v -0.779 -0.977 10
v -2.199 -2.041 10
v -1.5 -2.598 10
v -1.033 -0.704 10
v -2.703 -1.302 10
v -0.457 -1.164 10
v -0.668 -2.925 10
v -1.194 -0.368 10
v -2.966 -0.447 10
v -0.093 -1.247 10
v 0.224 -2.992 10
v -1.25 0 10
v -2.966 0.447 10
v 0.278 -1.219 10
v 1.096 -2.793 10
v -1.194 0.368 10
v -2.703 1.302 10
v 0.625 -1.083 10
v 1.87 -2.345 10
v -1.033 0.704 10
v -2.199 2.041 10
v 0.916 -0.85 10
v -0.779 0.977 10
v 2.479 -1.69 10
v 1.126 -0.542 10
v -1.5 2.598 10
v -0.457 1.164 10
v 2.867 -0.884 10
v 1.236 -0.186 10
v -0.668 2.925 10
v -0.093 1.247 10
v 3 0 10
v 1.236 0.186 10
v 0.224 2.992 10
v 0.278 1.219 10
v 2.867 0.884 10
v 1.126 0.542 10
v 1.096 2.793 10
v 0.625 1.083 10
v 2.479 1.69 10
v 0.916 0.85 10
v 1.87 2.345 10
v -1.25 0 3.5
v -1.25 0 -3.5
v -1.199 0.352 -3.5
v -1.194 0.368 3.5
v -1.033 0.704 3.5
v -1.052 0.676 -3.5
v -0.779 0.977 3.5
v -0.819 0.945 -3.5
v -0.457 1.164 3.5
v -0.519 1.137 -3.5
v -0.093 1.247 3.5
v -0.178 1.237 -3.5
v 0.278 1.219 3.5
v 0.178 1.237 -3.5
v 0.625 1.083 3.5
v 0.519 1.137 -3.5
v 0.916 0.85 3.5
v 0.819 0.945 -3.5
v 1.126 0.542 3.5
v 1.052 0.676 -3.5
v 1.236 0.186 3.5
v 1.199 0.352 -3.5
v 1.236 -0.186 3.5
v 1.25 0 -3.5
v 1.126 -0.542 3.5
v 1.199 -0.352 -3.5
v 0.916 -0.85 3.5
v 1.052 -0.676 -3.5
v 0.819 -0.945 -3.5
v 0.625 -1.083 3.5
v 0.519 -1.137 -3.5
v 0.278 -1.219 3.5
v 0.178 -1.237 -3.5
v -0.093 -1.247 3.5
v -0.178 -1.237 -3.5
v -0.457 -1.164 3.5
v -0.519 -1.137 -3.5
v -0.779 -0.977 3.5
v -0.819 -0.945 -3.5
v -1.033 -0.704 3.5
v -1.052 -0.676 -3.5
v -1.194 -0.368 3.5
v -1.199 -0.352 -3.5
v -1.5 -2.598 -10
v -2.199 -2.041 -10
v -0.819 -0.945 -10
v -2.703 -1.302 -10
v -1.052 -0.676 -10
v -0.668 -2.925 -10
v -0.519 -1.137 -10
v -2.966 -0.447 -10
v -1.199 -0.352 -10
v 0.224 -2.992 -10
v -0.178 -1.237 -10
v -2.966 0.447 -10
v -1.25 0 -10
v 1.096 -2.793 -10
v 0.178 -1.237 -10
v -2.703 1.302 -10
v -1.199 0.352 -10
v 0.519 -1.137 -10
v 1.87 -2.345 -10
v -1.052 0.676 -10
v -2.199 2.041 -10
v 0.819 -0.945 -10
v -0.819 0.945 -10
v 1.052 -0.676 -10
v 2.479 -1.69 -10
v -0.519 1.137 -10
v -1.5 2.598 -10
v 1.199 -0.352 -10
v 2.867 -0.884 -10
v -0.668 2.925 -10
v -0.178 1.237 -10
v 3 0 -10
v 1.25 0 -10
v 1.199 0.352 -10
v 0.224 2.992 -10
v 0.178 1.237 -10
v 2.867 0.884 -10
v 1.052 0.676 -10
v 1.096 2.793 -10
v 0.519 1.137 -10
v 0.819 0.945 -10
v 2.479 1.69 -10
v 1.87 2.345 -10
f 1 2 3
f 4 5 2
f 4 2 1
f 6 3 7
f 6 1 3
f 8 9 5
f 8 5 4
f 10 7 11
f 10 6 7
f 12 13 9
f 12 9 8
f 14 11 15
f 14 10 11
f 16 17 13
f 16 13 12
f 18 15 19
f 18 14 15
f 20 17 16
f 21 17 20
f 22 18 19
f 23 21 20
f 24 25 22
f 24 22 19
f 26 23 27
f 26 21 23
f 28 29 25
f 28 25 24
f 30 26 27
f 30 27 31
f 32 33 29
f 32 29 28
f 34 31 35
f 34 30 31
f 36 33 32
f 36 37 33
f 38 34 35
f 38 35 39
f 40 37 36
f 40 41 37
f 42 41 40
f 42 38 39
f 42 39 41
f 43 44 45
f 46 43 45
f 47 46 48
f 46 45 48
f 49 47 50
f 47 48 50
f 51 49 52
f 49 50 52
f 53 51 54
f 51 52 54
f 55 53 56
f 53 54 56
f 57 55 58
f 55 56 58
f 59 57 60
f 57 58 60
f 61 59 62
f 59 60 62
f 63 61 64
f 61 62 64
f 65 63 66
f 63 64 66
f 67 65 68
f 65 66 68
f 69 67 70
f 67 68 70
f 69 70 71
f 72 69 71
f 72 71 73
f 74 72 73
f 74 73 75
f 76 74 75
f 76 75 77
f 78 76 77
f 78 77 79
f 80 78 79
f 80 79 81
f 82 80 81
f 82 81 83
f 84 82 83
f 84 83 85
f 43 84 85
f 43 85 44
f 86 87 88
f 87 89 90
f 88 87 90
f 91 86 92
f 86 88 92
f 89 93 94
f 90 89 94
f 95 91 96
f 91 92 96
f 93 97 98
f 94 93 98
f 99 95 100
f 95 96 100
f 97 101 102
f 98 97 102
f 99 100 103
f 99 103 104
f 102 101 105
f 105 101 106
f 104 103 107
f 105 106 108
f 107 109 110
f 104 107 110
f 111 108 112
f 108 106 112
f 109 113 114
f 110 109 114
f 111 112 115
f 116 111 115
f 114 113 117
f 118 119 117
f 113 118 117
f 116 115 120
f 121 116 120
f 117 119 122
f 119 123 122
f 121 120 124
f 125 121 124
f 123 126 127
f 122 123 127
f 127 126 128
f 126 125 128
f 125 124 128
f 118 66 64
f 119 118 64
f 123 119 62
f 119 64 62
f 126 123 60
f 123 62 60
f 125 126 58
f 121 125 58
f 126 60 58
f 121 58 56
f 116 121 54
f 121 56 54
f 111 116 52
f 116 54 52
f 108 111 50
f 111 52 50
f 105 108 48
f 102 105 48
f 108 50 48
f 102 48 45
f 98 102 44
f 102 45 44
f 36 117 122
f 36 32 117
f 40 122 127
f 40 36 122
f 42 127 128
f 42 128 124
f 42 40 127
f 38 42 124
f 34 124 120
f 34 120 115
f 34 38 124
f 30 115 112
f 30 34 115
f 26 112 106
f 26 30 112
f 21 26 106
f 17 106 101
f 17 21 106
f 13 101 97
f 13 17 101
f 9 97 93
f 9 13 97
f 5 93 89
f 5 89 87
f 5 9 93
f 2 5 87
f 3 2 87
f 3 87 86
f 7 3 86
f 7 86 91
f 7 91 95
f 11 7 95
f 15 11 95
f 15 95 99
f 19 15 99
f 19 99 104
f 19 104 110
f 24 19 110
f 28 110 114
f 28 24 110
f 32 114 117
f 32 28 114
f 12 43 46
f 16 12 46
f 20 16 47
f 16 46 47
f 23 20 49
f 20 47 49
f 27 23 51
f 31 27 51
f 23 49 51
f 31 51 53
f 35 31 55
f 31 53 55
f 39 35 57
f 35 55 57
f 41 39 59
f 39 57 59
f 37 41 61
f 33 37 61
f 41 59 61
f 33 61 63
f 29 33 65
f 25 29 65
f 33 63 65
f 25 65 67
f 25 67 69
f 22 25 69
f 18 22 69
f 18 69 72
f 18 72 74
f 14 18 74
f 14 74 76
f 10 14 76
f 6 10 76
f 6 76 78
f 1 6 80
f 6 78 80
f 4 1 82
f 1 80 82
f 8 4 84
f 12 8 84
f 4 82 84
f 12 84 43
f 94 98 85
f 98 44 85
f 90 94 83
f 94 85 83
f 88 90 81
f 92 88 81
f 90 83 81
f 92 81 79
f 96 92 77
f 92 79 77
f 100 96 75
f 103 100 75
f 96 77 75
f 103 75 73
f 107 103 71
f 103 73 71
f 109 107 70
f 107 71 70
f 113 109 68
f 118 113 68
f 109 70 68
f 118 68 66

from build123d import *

# Parameters (mm, degrees)
SKETCH_1_R               = 3
EXTRUDE_1_DEPTH          = 10
M3X0_5_1_D               = 2.5
M3X0_5_1_DEPTH           = 6.5
M3X0_5_1_TIP             = 0.751075774
M3X0_5_1_ON_FACE_2_D     = 2.5
M3X0_5_1_ON_FACE_2_DEPTH = 6.5
M3X0_5_1_ON_FACE_2_TIP   = 0.751075774
SKETCH_3_R               = 1.25
CUT_EXTRUDE_1_DEPTH      = 20


with BuildPart() as part:
    # ｽｹｯﾁ1 → ﾎﾞｽ - 押し出し1 (new body, symmetric)
    with BuildSketch(Plane.XY):
        Circle(SKETCH_1_R)
    extrude(amount=EXTRUDE_1_DEPTH, both=True)

    # M3x0.5 ねじ穴1
    with Locations(Plane.XY.offset(10)):
        with Locations((0, 0)):
            Hole(M3X0_5_1_D / 2, depth=M3X0_5_1_DEPTH)
            with Locations((0, 0, -(M3X0_5_1_DEPTH + M3X0_5_1_TIP / 2))):  # 118° drill point
                Cone(0, M3X0_5_1_D / 2, M3X0_5_1_TIP, mode=Mode.SUBTRACT)

    # M3x0.5 ねじ穴1 on face 2
    with Locations(Plane(origin=(0, 0, -10), x_dir=(-1, 0, 0), z_dir=(0, 0, -1))):
        with Locations((0, 0)):
            Hole(M3X0_5_1_ON_FACE_2_D / 2, depth=M3X0_5_1_ON_FACE_2_DEPTH)
            with Locations((0, 0, -(M3X0_5_1_ON_FACE_2_DEPTH + M3X0_5_1_ON_FACE_2_TIP / 2))):  # 118° drill point
                Cone(0, M3X0_5_1_ON_FACE_2_D / 2, M3X0_5_1_ON_FACE_2_TIP, mode=Mode.SUBTRACT)

    # ｽｹｯﾁ3 → ｶｯﾄ - 押し出し1 (cut)
    with BuildSketch(Plane(origin=(0, 0, -10), x_dir=(-1, 0, 0), z_dir=(0, 0, -1))):
        Circle(SKETCH_3_R)
    extrude(amount=-CUT_EXTRUDE_1_DEPTH, mode=Mode.SUBTRACT)


solid = part.part
